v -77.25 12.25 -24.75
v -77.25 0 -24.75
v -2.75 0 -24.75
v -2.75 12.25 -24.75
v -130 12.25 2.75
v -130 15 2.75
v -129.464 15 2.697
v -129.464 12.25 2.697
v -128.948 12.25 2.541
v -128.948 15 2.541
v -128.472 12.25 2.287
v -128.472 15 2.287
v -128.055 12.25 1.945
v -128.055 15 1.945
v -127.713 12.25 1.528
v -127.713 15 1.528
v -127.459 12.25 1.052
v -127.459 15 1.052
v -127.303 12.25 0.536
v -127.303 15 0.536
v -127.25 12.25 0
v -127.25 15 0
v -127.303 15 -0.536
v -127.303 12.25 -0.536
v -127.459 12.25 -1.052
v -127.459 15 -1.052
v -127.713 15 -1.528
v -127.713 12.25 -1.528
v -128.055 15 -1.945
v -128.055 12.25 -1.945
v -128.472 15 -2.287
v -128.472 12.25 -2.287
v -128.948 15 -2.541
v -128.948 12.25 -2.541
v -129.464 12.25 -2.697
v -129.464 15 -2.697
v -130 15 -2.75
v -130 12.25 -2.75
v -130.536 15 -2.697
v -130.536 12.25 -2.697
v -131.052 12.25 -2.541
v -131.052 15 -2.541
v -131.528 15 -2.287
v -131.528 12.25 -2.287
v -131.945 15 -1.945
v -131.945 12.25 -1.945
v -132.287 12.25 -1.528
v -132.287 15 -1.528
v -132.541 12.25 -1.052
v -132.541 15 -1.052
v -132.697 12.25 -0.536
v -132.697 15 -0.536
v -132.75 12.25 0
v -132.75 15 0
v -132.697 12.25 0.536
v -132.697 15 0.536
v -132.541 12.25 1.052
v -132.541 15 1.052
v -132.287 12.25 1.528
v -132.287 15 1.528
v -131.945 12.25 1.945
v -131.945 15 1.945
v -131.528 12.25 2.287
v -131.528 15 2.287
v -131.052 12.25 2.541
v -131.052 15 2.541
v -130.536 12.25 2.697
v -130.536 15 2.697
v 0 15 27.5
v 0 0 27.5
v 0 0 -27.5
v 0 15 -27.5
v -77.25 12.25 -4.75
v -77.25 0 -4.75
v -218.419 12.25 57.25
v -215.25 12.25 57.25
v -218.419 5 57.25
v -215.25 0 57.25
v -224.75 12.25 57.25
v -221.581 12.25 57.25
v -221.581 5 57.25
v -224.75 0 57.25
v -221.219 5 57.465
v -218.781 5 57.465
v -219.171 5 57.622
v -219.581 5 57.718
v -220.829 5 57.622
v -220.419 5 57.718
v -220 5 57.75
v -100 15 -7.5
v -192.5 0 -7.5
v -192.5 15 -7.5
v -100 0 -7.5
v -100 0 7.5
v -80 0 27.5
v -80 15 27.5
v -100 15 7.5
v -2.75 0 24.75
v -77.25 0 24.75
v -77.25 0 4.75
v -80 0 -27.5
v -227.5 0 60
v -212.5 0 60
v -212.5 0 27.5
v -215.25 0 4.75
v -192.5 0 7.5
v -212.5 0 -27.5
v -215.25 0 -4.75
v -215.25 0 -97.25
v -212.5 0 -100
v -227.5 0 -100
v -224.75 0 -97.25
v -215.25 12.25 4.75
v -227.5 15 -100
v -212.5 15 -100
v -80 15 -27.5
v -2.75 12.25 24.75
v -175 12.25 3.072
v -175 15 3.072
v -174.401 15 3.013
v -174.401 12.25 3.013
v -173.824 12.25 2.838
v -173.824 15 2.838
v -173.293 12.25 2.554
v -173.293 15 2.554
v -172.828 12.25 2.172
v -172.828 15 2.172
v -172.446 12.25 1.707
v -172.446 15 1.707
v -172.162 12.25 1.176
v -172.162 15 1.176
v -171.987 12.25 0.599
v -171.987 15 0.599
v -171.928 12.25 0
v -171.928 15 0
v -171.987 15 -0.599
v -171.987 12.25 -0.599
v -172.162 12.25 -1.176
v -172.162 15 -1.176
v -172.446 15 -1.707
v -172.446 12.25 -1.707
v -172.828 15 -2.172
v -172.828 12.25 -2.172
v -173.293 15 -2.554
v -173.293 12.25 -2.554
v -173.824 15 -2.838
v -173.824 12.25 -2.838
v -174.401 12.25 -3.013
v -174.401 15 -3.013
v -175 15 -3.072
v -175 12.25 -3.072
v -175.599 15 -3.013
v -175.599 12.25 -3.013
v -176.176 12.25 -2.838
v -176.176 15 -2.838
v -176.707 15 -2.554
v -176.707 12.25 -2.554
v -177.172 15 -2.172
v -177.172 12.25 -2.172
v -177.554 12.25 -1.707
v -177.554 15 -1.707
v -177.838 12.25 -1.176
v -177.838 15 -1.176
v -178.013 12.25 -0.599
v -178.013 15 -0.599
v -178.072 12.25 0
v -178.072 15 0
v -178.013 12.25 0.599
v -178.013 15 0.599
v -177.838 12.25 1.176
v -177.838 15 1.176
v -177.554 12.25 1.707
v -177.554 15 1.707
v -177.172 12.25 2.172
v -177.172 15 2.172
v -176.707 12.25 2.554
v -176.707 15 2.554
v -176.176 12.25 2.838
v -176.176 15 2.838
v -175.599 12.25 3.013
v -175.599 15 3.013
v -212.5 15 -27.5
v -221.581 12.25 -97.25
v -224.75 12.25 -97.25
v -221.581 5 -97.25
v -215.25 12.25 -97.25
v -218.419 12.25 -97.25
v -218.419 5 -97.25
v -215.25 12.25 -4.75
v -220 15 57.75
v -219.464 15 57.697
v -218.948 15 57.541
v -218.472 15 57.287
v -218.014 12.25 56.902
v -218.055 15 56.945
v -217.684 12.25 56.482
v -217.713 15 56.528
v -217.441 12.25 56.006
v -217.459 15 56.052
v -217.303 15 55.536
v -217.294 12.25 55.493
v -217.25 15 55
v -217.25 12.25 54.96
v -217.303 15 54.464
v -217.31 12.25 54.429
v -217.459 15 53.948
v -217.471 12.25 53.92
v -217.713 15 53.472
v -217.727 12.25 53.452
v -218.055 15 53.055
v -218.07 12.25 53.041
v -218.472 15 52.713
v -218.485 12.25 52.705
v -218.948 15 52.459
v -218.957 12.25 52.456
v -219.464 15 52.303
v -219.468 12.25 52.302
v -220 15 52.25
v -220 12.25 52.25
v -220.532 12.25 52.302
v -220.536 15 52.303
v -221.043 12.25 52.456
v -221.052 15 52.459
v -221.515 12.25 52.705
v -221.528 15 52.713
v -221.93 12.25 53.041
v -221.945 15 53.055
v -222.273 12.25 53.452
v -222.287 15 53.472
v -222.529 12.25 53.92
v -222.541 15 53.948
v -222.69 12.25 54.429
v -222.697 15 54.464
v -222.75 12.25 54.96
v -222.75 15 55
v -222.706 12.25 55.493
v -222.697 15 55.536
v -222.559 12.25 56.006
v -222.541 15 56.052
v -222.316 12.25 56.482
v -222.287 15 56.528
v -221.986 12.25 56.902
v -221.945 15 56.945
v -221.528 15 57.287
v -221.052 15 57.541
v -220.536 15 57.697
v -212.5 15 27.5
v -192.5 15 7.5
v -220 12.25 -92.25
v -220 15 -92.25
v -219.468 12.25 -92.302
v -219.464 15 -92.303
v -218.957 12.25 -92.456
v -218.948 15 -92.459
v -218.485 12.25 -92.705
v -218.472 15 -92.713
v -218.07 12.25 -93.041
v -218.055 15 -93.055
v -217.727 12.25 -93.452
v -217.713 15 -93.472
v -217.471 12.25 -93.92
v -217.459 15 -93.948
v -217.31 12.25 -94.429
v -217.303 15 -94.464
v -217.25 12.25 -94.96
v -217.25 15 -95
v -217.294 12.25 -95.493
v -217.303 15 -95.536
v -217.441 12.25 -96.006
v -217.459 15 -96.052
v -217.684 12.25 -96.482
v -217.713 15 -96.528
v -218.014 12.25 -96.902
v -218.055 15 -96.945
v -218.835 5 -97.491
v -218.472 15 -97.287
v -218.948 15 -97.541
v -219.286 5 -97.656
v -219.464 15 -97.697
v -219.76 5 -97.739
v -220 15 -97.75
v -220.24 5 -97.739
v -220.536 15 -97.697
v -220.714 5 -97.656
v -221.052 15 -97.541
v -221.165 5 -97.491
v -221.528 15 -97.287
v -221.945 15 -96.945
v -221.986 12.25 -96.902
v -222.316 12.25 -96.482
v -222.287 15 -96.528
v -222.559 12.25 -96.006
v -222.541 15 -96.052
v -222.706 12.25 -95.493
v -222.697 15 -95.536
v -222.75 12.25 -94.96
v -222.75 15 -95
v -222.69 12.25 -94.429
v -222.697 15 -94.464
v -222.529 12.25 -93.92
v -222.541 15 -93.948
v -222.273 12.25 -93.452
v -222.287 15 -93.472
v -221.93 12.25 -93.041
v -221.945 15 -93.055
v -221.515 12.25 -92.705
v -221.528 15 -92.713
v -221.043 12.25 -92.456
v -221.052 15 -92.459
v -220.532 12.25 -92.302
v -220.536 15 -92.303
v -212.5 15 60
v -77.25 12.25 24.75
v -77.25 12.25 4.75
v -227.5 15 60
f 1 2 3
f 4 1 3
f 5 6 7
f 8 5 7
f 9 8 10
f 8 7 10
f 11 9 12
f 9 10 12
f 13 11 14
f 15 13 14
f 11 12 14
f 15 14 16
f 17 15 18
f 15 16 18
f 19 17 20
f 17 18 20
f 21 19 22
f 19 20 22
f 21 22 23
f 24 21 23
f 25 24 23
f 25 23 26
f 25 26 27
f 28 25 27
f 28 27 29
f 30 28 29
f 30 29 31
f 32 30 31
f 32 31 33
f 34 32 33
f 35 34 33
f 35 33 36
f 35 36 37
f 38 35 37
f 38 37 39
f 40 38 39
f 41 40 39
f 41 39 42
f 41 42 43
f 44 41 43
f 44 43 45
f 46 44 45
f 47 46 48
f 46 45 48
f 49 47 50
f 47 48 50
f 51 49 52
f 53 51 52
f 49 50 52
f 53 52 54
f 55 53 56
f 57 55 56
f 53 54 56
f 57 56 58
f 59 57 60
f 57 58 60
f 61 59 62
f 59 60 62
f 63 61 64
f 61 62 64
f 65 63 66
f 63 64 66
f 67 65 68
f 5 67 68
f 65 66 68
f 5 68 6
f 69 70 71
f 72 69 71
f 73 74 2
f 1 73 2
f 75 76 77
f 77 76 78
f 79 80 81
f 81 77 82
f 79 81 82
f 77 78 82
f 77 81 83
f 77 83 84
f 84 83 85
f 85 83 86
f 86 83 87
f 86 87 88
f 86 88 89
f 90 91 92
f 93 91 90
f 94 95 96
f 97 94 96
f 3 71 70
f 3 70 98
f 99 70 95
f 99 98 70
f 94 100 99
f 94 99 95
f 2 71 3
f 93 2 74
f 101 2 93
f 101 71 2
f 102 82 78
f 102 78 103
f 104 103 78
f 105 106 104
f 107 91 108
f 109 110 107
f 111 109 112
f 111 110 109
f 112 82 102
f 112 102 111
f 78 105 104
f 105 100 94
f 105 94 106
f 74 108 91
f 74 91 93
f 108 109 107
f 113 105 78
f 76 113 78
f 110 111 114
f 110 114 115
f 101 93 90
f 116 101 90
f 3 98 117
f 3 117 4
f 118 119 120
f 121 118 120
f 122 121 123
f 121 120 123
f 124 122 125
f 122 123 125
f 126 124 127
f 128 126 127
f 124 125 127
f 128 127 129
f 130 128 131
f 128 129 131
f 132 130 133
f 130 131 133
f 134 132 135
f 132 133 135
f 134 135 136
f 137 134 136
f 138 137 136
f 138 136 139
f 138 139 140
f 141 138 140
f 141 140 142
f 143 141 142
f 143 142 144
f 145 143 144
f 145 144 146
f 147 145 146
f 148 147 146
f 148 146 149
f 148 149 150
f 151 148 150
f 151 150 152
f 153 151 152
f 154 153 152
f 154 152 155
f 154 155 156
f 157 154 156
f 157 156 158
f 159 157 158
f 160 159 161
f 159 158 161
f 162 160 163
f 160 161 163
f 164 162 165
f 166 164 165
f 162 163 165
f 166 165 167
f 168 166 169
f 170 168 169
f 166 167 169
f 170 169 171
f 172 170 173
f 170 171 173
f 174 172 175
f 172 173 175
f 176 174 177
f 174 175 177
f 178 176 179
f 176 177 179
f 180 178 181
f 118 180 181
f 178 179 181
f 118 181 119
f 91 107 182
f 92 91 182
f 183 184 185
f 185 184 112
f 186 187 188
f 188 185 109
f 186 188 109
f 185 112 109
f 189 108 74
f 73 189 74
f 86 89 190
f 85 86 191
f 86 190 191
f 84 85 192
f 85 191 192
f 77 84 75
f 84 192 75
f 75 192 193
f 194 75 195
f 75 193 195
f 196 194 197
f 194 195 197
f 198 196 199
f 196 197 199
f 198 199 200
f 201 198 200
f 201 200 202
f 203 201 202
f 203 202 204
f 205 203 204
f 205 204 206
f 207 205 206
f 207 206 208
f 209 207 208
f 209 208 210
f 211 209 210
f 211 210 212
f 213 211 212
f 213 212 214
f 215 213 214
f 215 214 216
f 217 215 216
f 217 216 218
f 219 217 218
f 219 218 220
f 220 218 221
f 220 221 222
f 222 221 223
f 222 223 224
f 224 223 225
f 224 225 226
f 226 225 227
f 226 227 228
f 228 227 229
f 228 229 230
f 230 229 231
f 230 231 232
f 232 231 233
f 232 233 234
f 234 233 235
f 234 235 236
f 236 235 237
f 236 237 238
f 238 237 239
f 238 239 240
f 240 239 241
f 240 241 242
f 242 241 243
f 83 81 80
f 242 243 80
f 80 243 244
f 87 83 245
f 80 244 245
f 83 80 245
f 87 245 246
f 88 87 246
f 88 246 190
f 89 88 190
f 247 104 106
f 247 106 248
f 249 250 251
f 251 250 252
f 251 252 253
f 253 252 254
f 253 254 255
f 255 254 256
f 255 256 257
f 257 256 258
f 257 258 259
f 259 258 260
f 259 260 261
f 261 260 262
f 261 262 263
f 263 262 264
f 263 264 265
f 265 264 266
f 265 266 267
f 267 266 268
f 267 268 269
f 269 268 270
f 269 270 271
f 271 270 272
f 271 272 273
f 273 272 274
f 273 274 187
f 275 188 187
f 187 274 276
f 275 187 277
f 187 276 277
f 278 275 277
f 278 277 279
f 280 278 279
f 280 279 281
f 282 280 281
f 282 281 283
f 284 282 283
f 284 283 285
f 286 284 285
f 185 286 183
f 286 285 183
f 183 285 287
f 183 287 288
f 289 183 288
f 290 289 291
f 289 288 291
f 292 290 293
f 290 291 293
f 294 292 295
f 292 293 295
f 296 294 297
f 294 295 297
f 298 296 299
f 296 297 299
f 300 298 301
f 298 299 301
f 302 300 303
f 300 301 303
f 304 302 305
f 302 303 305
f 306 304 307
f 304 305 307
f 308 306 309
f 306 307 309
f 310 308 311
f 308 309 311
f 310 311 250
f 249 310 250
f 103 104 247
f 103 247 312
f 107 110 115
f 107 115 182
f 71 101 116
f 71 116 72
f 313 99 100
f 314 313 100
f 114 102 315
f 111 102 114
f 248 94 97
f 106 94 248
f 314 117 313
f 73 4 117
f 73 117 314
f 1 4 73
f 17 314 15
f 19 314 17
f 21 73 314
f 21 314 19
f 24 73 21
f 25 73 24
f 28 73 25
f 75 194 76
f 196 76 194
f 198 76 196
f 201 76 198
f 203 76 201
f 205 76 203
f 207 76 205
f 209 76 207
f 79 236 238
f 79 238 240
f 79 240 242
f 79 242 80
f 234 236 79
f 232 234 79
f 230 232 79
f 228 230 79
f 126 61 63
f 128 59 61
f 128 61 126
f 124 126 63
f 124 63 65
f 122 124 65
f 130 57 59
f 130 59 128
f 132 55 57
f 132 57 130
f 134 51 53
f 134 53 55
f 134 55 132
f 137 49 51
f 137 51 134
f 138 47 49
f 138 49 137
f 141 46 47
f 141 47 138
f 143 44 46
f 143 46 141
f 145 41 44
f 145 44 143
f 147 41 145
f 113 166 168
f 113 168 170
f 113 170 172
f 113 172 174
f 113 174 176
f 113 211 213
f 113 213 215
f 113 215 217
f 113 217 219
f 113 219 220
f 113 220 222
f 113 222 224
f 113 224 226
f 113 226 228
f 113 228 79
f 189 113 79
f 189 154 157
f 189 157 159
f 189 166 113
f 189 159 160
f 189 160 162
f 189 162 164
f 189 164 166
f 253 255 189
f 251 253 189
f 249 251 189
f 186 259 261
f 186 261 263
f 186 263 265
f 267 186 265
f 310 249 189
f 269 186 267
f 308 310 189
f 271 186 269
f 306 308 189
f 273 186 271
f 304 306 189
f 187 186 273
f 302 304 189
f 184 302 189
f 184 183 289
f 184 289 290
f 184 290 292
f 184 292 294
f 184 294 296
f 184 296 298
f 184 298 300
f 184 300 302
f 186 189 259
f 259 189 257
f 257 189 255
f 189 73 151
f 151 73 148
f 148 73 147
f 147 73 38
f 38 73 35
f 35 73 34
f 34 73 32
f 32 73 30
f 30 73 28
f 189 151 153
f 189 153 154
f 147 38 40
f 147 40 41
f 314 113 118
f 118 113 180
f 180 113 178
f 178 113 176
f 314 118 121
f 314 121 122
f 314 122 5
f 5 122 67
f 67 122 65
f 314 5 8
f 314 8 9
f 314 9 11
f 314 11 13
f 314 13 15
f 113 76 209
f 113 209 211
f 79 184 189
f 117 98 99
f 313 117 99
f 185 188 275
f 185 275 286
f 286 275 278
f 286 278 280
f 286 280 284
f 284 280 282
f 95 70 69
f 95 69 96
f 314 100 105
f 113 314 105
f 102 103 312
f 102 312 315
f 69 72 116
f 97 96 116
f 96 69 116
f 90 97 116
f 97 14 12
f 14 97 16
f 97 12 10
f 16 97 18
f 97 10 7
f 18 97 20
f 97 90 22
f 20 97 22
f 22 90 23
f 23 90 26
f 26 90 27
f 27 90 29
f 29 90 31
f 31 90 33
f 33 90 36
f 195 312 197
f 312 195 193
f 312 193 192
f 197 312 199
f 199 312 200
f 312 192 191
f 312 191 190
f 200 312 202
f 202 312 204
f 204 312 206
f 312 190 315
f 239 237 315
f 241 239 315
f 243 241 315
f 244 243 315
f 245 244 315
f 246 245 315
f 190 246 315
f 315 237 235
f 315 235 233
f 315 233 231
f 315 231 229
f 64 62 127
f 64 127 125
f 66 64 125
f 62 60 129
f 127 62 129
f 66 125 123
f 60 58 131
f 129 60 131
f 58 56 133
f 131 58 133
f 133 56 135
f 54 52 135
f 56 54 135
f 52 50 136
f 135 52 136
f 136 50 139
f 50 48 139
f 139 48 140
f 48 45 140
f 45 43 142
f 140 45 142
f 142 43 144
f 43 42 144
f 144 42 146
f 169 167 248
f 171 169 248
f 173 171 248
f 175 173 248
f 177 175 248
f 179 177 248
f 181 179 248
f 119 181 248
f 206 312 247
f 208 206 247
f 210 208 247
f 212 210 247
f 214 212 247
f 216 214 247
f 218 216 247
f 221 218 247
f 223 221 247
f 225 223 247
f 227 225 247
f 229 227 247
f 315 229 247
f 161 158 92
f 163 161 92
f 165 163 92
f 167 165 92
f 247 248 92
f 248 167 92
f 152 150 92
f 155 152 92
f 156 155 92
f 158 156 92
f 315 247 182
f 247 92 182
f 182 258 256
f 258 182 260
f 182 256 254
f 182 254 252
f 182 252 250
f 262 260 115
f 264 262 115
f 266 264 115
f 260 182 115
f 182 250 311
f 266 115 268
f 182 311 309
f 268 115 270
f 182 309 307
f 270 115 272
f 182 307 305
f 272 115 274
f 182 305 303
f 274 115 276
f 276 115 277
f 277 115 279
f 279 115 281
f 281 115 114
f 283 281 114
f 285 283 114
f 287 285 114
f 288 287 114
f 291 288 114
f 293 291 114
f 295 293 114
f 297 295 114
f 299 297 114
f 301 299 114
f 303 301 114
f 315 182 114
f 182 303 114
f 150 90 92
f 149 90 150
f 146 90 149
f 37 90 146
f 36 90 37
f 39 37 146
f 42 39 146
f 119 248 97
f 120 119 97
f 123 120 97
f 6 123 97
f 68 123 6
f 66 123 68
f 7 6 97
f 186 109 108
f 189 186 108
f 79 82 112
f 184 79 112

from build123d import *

# Parameters (mm, degrees)
BOSS_EXTRUDE1_DEPTH = 15
SHELL1_T            = -2.75
SKETCH2_R           = 2.75
SKETCH2_R_2         = 3.071803615
CUT_EXTRUDE1_DEPTH  = 10
CHAMFER1_SIZE       = 20


with BuildPart() as part:
    # Sketch1 → Boss-Extrude1 (new body)
    with BuildSketch(Plane(origin=(0, 0, 0), x_dir=(1, 0, 0), z_dir=(0, 1, 0))):
        Polygon((-227.5, 100), (-212.5, 100), (-212.5, 7.5), (-80, 7.5), (-80, 27.5), (0, 27.5), (0, 7.5), (0, -7.5), (0, -27.5), (-80, -27.5), (-80, -7.5), (-212.5, -7.5), (-212.5, -60), (-227.5, -60), align=None)
    extrude(amount=BOSS_EXTRUDE1_DEPTH)

    # Shell1
    shell1_openings = [part.faces().sort_by_distance(p)[0] for p in [
        (-113.191678521, 0, -5.46230441),
    ]]
    offset(amount=SHELL1_T, openings=shell1_openings, kind=Kind.INTERSECTION)

    # Sketch2 → Cut-Extrude1 (cut)
    with BuildSketch(Plane(origin=(0, 15, 0), x_dir=(1, 0, 0), z_dir=(0, 1, 0))):
        with Locations(Location((-130, 0, 0), (0, 0, 270))):
            Circle(SKETCH2_R)
        with Locations(Location((-220, 95, 0), (0, 0, 270))):
            Circle(SKETCH2_R)
        with Locations(Location((-220, -55, 0), (0, 0, 270))):
            Circle(SKETCH2_R)
        with Locations(Location((-175, 0, 0), (0, 0, 270))):
            Circle(SKETCH2_R_2)
    extrude(amount=-CUT_EXTRUDE1_DEPTH, mode=Mode.SUBTRACT)

    # Chamfer1
    chamfer1_edges = [part.edges().sort_by_distance(p)[0] for p in [
        (-212.5, 7.5, -7.5),
        (-212.5, 7.5, 7.5),
        (-80, 7.5, -7.5),
        (-80, 7.5, 7.5),
    ]]
    chamfer(chamfer1_edges, length=CHAMFER1_SIZE - 0.0001)  # a hair under: the kernel refuses the full size


solid = part.part
